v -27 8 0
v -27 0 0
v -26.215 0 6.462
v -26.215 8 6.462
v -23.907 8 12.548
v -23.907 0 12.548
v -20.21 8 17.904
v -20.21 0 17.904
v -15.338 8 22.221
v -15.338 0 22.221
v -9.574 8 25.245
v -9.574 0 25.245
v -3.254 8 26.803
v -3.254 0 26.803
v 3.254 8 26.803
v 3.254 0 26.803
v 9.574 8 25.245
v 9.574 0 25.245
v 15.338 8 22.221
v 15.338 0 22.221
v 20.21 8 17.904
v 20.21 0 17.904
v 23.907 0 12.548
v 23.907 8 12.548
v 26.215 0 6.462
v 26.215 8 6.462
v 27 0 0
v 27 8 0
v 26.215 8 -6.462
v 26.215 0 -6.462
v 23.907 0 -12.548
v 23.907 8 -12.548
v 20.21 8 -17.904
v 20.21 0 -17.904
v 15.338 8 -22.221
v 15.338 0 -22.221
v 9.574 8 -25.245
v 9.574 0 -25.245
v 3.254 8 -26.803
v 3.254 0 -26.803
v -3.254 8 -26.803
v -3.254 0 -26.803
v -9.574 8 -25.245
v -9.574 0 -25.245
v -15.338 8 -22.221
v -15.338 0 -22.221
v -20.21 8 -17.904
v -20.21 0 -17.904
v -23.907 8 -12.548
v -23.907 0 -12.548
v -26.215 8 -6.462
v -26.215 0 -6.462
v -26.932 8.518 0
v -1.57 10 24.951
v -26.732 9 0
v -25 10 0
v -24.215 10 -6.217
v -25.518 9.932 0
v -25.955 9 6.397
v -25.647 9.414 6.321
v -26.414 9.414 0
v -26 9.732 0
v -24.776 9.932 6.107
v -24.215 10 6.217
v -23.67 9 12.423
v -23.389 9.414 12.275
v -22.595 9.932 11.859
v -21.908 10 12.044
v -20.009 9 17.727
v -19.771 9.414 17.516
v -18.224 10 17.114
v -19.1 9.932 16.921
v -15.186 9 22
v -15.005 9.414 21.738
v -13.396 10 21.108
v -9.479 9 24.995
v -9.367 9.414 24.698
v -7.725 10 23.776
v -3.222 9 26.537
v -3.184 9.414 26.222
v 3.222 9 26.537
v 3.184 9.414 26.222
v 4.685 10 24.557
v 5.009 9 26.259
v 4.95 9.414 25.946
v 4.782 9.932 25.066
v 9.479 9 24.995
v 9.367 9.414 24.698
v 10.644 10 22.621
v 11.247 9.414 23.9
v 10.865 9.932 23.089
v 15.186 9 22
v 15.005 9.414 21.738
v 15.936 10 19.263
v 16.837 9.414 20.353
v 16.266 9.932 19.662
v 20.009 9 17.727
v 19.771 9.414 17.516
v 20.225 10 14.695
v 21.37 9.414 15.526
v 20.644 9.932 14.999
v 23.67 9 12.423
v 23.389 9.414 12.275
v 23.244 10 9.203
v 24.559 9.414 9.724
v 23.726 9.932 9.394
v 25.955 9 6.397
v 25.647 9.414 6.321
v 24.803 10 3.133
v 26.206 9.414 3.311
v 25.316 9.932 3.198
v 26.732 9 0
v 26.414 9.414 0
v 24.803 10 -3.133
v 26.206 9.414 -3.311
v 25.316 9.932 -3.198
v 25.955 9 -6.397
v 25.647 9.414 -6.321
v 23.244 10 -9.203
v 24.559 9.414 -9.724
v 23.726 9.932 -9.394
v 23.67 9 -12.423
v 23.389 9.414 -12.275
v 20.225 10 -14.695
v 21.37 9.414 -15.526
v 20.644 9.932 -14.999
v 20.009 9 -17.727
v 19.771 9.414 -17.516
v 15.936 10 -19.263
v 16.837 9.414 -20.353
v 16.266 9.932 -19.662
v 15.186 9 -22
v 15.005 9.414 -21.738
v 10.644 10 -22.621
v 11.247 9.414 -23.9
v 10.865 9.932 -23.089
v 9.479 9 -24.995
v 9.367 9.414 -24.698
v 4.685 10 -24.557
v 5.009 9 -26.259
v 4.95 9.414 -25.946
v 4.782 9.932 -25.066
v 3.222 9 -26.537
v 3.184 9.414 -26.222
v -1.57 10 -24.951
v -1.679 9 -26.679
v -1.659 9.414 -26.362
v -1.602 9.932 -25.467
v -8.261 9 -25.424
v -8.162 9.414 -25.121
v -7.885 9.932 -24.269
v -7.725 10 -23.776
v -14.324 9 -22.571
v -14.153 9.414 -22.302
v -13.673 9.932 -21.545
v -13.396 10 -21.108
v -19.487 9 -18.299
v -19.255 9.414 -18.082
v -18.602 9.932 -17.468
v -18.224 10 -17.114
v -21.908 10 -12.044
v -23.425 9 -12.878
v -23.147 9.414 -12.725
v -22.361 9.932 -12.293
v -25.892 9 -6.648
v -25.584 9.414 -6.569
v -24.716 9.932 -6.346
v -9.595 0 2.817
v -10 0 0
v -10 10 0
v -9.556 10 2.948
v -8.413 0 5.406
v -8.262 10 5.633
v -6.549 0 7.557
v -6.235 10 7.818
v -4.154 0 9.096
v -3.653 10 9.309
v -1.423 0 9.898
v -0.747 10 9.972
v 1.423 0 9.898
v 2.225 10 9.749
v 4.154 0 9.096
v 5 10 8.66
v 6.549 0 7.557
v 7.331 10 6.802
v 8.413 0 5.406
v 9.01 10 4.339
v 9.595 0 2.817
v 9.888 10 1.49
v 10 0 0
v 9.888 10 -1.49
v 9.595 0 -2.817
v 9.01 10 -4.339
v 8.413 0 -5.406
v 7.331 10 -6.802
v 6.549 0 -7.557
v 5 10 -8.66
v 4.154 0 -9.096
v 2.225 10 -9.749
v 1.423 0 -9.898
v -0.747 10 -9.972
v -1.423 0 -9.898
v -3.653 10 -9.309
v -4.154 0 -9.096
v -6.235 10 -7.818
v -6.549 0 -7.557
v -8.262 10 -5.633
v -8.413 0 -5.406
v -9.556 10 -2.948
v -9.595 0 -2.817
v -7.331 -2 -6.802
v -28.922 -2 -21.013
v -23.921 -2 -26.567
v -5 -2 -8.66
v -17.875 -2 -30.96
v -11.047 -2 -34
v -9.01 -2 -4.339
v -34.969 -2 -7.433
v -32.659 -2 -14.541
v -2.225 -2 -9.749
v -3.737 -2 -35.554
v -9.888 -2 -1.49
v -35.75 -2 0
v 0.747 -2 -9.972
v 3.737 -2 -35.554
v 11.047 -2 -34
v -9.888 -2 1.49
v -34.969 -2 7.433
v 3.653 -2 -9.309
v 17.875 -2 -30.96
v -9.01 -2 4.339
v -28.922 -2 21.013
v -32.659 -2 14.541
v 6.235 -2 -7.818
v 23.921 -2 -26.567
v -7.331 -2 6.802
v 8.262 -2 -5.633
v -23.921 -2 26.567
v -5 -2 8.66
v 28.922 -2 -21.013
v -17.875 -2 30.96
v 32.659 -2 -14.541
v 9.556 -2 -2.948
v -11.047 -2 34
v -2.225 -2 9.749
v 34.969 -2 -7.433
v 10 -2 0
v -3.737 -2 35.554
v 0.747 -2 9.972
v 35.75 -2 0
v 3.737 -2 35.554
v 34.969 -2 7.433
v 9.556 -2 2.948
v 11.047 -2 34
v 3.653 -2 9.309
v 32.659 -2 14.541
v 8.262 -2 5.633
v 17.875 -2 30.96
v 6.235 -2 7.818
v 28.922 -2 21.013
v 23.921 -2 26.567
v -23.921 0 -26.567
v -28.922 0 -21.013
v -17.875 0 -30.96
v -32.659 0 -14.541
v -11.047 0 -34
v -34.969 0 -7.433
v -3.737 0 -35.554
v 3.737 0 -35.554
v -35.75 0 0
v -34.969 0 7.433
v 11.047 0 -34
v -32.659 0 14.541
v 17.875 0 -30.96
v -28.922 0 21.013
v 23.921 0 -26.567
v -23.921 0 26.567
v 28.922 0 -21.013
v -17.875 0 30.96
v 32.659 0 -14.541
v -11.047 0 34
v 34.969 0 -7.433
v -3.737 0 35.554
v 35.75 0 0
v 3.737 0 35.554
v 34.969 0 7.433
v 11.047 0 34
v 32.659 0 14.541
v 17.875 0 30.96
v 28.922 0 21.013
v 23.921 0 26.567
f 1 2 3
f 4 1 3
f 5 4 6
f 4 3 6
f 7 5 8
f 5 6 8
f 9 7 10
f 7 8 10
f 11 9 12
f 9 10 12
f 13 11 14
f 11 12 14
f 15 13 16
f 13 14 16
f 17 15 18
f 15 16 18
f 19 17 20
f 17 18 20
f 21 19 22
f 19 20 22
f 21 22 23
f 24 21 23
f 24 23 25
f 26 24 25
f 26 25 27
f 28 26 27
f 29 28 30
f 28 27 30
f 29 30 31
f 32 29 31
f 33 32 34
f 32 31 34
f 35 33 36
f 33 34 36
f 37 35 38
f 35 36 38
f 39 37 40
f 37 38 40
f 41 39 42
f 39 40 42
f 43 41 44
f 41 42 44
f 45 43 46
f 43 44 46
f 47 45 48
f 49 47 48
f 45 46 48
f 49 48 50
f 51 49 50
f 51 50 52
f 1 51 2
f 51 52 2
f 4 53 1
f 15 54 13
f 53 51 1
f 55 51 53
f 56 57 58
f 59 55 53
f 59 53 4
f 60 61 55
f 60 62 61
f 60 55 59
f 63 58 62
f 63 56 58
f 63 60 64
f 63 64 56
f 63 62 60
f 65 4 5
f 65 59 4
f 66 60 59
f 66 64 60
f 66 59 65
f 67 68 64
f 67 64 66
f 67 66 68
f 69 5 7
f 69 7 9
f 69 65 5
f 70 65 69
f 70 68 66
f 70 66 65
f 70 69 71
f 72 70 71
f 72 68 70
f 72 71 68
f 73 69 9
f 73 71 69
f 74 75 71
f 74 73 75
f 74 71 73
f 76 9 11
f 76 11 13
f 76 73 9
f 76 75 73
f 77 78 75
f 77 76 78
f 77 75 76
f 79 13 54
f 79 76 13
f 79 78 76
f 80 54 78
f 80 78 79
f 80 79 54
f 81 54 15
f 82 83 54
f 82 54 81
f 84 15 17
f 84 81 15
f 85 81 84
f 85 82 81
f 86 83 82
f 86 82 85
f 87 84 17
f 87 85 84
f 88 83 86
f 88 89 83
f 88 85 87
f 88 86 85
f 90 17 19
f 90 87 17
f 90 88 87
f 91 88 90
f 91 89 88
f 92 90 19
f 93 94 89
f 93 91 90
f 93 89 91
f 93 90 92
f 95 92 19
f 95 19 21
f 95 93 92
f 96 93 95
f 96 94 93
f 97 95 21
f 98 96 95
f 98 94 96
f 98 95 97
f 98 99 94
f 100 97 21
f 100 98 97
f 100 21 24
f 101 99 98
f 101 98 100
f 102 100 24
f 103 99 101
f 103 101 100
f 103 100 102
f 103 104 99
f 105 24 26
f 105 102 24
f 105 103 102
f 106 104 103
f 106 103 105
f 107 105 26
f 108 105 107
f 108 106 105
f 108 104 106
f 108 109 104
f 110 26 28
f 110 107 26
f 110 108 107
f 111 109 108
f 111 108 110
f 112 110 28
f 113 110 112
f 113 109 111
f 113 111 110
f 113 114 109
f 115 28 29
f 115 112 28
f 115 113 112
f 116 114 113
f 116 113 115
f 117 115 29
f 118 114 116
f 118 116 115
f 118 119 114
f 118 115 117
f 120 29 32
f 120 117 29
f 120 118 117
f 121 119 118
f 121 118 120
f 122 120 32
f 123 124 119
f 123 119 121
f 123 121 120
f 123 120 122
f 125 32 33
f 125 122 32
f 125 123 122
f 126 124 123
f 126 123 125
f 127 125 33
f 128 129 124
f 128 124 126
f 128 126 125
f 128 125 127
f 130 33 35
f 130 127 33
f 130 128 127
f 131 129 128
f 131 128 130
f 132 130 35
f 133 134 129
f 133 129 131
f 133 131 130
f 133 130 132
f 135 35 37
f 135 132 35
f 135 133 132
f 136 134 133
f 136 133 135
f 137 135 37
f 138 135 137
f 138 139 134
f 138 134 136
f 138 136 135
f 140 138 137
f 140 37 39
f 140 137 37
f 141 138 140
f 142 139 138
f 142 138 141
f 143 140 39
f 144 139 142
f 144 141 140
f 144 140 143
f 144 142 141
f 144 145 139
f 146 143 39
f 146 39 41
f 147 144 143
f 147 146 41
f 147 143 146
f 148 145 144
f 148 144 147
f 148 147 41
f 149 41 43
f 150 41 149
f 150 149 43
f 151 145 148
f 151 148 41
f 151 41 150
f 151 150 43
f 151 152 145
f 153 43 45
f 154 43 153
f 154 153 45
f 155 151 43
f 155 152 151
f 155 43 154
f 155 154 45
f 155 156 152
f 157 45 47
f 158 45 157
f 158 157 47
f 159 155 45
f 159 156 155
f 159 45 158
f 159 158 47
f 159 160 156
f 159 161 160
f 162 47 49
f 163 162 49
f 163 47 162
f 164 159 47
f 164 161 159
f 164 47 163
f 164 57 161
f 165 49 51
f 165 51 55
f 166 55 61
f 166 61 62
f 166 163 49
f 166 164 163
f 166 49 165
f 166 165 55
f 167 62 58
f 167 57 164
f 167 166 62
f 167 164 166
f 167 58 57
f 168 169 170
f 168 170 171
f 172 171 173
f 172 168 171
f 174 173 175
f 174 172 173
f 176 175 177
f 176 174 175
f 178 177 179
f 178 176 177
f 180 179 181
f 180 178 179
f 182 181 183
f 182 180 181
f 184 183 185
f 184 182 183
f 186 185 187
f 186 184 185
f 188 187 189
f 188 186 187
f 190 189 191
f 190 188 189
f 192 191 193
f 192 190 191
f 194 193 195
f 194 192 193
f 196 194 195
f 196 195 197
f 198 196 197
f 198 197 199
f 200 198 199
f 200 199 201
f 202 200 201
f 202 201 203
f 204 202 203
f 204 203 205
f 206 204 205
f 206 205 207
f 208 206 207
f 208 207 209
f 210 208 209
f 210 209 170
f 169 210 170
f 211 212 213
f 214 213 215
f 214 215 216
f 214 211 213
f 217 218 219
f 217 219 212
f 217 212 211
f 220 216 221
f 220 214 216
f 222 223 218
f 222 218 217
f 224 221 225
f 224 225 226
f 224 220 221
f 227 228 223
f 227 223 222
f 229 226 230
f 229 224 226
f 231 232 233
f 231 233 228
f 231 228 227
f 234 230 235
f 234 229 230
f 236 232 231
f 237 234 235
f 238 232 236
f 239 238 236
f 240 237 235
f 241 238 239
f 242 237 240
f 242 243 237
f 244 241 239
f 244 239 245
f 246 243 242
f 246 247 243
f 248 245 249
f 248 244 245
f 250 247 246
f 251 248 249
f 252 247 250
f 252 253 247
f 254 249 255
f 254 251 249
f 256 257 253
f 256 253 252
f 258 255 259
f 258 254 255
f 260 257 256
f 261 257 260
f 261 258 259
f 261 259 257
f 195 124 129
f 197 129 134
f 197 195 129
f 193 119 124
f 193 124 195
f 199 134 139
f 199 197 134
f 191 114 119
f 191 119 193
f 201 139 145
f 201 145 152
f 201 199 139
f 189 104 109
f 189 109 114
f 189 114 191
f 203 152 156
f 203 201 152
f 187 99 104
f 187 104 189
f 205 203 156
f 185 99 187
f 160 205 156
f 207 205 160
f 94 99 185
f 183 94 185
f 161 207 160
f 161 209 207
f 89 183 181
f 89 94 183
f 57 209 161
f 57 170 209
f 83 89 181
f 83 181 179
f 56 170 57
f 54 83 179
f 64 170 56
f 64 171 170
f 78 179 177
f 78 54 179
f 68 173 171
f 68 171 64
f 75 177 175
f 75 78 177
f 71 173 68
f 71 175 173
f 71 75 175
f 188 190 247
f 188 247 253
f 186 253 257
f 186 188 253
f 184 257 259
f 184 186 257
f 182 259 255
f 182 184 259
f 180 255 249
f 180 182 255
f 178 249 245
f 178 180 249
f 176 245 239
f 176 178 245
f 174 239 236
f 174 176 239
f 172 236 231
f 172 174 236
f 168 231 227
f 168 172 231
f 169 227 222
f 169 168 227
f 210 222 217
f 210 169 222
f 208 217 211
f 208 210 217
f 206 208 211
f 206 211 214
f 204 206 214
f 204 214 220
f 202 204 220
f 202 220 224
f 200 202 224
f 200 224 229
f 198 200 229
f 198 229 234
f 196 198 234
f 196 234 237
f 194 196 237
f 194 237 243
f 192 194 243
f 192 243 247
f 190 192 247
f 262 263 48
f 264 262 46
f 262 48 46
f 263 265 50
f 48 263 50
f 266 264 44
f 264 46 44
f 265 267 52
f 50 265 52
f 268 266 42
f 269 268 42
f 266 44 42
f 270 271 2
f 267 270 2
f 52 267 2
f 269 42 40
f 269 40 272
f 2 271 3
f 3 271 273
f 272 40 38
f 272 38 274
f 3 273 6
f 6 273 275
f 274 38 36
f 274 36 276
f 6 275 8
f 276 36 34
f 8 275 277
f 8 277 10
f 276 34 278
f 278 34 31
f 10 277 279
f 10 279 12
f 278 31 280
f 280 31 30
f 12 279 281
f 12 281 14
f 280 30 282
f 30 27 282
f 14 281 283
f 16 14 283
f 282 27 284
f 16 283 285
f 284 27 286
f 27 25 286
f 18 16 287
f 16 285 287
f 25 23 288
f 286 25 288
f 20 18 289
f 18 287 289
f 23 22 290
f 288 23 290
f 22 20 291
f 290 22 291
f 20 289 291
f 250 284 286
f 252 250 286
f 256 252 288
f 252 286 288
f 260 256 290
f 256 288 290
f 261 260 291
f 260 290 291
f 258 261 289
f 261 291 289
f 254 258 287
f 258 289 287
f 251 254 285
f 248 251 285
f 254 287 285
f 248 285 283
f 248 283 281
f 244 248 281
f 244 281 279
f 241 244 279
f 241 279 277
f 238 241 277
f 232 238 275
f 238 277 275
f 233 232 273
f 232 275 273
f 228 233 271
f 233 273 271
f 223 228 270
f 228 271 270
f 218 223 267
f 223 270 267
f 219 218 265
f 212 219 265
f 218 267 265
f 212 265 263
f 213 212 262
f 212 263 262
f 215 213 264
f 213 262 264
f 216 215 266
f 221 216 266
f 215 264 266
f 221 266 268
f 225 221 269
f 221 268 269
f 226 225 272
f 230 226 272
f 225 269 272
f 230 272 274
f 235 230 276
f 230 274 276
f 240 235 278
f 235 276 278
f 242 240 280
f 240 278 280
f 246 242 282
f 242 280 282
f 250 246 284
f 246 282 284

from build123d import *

# Parameters (mm, degrees)
F0_R     = 35.75
F0_R_2   = 10
F1_DEPTH = 2
F2_R     = 27
F2_R_2   = 10
F3_DEPTH = 10
F4_R     = 2


with BuildPart() as f1:
    # F0 (on Front) → F1 (new body)
    with BuildSketch(Plane.XZ):
        Circle(F0_R)
        Circle(F0_R_2, mode=Mode.SUBTRACT)
    extrude(amount=F1_DEPTH)

    # F2 (on face) → F3 (join)
    with BuildSketch(Plane(origin=(0, 0, 0), x_dir=(-1, 0, 0), z_dir=(0, 1, 0))):
        Circle(F2_R)
        Circle(F2_R_2, mode=Mode.SUBTRACT)
    extrude(amount=F3_DEPTH)

    # F4
    f4_edges = [f1.edges().sort_by_distance(p)[0] for p in [
        (27, 10, 0),
    ]]
    fillet(f4_edges, radius=F4_R)


solid = f1.part
